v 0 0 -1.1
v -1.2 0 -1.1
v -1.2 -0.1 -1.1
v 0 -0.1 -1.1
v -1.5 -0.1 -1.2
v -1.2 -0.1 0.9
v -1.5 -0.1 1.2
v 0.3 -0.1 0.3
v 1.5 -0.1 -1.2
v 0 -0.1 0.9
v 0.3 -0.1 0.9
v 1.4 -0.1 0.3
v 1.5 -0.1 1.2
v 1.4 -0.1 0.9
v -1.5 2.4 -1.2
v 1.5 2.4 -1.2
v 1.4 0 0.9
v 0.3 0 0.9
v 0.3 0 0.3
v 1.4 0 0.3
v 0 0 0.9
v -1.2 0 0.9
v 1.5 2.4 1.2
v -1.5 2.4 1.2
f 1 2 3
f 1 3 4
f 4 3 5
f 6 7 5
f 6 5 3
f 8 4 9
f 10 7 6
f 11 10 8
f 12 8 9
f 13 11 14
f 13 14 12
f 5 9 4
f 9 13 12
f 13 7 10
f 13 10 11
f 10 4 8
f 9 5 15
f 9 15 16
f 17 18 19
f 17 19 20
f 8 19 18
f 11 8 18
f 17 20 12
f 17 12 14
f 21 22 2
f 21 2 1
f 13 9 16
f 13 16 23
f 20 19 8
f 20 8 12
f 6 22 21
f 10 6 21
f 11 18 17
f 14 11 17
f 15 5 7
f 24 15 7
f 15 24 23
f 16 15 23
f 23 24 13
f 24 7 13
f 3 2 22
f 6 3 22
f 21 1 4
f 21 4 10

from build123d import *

# Parameters (mm, degrees)
F0_W     = 3
F0_H     = 2.4
F0_W_2   = 1.2
F0_H_2   = 2
F0_W_3   = 1.1
F0_H_3   = 0.6
F1_DEPTH = 0.1
F2_DEPTH = 2.4


with BuildPart() as f1:
    # F0 (on Front) → F1 (new body)
    with BuildSketch(Plane.XZ):
        Rectangle(F0_W, F0_H)
        with Locations((-0.6, -0.1)):
            Rectangle(F0_W_2, F0_H_2, mode=Mode.SUBTRACT)
        with Locations((0.85, 0.6)):
            Rectangle(F0_W_3, F0_H_3, mode=Mode.SUBTRACT)
    extrude(amount=F1_DEPTH)

    # F0 (on Front) → F2 (join)
    with BuildSketch(Plane.XZ):
        Rectangle(F0_W, F0_H)
        with Locations((-0.6, -0.1)):
            Rectangle(F0_W_2, F0_H_2, mode=Mode.SUBTRACT)
        with Locations((0.85, 0.6)):
            Rectangle(F0_W_3, F0_H_3, mode=Mode.SUBTRACT)
        with Locations((-0.6, -0.1)):
            Rectangle(F0_W_2, F0_H_2)
        with Locations((0.85, 0.6)):
            Rectangle(F0_W_3, F0_H_3)
    extrude(amount=-F2_DEPTH)


solid = f1.part
